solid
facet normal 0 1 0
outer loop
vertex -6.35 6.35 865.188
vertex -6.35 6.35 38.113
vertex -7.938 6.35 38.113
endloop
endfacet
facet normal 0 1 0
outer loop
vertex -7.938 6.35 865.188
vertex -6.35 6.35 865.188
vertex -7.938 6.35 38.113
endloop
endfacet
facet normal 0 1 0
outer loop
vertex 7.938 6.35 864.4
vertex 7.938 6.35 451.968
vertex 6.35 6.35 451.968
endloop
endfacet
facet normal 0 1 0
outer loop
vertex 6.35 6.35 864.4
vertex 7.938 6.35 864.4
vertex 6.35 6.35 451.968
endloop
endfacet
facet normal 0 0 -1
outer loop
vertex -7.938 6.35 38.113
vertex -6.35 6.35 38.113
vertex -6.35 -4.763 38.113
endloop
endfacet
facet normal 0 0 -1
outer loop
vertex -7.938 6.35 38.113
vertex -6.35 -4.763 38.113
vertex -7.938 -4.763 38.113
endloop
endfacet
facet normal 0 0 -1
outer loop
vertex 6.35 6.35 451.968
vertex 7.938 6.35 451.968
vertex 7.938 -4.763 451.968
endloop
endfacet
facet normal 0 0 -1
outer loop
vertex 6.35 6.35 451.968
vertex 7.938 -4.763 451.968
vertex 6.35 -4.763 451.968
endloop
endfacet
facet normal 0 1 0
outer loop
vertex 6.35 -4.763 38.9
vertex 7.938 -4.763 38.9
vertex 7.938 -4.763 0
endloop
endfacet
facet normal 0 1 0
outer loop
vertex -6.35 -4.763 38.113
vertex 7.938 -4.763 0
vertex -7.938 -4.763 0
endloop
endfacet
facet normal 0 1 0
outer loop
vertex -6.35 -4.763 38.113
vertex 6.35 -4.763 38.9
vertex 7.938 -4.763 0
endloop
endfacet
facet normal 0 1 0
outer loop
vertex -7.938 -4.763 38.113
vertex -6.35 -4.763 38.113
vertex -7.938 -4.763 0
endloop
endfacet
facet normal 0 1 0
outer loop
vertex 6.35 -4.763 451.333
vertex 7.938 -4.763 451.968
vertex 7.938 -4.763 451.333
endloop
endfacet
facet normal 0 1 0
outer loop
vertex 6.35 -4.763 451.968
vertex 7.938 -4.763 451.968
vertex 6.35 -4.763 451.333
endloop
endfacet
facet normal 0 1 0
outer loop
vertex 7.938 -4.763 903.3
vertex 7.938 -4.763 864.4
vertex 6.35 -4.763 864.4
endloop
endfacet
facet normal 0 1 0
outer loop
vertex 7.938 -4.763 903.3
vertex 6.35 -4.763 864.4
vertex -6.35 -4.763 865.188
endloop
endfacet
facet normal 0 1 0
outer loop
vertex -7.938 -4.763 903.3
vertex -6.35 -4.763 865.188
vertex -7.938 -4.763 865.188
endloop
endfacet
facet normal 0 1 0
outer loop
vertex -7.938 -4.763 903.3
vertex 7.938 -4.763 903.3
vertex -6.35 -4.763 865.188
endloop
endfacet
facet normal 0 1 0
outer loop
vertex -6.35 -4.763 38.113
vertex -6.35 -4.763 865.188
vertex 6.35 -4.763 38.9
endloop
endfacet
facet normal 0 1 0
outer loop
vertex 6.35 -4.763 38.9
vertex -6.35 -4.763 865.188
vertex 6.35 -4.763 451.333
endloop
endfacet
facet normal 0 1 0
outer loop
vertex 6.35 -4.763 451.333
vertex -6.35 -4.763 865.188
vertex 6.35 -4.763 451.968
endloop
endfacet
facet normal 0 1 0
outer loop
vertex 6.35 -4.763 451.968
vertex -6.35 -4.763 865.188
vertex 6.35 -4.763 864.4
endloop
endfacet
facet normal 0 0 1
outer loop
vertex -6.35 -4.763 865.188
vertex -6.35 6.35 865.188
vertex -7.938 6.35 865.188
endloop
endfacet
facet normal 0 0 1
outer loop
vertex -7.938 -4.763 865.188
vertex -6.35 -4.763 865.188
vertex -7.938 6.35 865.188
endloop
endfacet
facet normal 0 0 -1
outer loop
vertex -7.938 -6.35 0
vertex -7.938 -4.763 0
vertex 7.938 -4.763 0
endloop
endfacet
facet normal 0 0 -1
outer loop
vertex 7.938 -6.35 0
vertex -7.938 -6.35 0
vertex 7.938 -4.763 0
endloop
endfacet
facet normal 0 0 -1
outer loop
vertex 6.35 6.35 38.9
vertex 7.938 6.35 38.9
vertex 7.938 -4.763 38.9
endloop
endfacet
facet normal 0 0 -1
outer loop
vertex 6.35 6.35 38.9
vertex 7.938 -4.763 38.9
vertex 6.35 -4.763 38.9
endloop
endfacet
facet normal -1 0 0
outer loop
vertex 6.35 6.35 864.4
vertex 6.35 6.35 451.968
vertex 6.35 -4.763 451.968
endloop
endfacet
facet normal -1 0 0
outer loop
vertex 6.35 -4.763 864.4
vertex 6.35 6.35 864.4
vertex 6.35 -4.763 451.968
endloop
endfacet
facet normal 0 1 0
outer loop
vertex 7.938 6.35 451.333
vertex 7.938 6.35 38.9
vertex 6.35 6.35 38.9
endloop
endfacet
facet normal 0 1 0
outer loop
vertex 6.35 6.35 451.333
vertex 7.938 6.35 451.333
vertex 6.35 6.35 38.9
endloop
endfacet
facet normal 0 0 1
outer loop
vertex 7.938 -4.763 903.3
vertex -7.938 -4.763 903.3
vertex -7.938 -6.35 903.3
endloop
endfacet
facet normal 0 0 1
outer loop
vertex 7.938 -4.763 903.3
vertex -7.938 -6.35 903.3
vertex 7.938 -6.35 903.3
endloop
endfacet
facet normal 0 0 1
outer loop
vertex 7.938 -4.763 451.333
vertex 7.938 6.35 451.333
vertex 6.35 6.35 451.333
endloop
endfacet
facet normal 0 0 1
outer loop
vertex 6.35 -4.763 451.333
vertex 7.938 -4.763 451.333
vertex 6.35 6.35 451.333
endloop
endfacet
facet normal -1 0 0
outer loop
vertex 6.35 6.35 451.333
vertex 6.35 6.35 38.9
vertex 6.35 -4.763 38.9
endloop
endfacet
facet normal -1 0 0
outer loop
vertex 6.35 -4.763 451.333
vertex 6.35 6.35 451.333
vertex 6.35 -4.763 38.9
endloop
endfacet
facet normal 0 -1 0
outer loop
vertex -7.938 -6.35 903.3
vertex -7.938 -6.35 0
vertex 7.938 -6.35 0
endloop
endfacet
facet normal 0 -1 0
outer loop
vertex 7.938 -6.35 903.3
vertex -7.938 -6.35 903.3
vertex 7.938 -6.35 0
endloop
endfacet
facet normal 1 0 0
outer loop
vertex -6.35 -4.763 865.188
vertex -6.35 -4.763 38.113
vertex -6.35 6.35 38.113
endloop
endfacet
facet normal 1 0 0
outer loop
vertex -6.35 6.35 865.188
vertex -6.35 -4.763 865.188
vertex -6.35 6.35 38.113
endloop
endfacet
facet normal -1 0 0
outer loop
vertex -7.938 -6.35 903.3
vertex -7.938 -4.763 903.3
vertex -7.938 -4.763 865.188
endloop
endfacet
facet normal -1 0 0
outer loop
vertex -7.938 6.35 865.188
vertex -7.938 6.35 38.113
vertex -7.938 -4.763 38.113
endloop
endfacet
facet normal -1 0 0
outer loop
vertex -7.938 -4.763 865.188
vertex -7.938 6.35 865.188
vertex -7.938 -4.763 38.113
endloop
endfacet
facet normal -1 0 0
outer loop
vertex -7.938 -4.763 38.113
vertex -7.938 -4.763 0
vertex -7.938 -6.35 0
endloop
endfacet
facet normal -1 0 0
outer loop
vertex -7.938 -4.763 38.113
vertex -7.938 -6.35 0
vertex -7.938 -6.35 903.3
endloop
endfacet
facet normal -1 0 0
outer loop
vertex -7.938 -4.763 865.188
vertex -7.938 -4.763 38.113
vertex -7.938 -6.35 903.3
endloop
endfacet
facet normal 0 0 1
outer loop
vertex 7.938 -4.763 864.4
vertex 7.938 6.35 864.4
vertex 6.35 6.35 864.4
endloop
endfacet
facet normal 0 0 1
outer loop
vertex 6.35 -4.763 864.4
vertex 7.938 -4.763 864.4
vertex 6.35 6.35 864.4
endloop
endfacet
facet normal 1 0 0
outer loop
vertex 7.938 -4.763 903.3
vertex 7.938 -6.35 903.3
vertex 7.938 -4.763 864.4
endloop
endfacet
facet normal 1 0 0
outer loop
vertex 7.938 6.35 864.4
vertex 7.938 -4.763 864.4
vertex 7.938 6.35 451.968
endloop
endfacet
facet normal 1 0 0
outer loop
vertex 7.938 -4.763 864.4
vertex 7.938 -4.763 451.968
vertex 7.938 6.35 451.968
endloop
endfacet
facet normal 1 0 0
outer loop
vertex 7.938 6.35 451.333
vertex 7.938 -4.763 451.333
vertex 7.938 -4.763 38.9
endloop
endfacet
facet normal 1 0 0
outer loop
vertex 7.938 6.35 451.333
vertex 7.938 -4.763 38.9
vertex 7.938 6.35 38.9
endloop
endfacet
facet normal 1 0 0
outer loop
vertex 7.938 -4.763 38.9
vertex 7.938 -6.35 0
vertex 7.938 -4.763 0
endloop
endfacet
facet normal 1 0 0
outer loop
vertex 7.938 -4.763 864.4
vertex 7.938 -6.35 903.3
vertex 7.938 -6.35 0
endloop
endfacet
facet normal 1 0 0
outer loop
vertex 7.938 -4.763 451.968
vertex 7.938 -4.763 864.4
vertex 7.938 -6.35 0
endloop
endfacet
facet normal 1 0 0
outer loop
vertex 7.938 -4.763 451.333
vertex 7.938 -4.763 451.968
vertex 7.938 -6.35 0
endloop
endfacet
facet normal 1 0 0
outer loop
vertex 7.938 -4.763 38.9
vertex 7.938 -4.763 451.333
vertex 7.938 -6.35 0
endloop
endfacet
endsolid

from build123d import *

# Parameters (mm, degrees)
F1_DEPTH = 903.3002
F2_W     = 1.5875
F2_H     = 38.9001
F2_H_2   = 0.635
F3_DEPTH = 11.1125
F4_W     = 1.5875
F4_H     = 38.1127
F5_DEPTH = 11.1125


with BuildPart() as f1:
    # F0 (on Top) → F1 (new body)
    with BuildSketch(Plane.XY):
        Polygon((-6.35, -6.35), (6.35, -6.35), (7.9375, -6.35), (7.9375, 6.35), (6.35, 6.35), (6.35, -4.7625), (-6.35, -4.7625), (-6.35, 6.35), (-7.9375, 6.35), (-7.9375, -6.35), align=None)
    extrude(amount=F1_DEPTH)

    # F2 (on face) → F3 (cut)
    with BuildSketch(Plane(origin=(0, 6.35, 0), x_dir=(-1, 0, 0), z_dir=(0, 1, 0))):
        with Locations((-7.14375, 19.45005)):
            Rectangle(F2_W, F2_H)
        with Locations((-7.14375, 883.85015)):
            Rectangle(F2_W, F2_H)
        with Locations((-7.14375, 451.6501)):
            Rectangle(F2_W, F2_H_2)
    extrude(amount=-F3_DEPTH, mode=Mode.SUBTRACT)

    # F4 (on face) → F5 (cut)
    with BuildSketch(Plane(origin=(0, 6.35, 0), x_dir=(-1, 0, 0), z_dir=(0, 1, 0))):
        with Locations((7.14375, 19.05635)):
            Rectangle(F4_W, F4_H)
        with Locations((7.14375, 884.24385)):
            Rectangle(F4_W, F4_H)
    extrude(amount=-F5_DEPTH, mode=Mode.SUBTRACT)


solid = f1.part
